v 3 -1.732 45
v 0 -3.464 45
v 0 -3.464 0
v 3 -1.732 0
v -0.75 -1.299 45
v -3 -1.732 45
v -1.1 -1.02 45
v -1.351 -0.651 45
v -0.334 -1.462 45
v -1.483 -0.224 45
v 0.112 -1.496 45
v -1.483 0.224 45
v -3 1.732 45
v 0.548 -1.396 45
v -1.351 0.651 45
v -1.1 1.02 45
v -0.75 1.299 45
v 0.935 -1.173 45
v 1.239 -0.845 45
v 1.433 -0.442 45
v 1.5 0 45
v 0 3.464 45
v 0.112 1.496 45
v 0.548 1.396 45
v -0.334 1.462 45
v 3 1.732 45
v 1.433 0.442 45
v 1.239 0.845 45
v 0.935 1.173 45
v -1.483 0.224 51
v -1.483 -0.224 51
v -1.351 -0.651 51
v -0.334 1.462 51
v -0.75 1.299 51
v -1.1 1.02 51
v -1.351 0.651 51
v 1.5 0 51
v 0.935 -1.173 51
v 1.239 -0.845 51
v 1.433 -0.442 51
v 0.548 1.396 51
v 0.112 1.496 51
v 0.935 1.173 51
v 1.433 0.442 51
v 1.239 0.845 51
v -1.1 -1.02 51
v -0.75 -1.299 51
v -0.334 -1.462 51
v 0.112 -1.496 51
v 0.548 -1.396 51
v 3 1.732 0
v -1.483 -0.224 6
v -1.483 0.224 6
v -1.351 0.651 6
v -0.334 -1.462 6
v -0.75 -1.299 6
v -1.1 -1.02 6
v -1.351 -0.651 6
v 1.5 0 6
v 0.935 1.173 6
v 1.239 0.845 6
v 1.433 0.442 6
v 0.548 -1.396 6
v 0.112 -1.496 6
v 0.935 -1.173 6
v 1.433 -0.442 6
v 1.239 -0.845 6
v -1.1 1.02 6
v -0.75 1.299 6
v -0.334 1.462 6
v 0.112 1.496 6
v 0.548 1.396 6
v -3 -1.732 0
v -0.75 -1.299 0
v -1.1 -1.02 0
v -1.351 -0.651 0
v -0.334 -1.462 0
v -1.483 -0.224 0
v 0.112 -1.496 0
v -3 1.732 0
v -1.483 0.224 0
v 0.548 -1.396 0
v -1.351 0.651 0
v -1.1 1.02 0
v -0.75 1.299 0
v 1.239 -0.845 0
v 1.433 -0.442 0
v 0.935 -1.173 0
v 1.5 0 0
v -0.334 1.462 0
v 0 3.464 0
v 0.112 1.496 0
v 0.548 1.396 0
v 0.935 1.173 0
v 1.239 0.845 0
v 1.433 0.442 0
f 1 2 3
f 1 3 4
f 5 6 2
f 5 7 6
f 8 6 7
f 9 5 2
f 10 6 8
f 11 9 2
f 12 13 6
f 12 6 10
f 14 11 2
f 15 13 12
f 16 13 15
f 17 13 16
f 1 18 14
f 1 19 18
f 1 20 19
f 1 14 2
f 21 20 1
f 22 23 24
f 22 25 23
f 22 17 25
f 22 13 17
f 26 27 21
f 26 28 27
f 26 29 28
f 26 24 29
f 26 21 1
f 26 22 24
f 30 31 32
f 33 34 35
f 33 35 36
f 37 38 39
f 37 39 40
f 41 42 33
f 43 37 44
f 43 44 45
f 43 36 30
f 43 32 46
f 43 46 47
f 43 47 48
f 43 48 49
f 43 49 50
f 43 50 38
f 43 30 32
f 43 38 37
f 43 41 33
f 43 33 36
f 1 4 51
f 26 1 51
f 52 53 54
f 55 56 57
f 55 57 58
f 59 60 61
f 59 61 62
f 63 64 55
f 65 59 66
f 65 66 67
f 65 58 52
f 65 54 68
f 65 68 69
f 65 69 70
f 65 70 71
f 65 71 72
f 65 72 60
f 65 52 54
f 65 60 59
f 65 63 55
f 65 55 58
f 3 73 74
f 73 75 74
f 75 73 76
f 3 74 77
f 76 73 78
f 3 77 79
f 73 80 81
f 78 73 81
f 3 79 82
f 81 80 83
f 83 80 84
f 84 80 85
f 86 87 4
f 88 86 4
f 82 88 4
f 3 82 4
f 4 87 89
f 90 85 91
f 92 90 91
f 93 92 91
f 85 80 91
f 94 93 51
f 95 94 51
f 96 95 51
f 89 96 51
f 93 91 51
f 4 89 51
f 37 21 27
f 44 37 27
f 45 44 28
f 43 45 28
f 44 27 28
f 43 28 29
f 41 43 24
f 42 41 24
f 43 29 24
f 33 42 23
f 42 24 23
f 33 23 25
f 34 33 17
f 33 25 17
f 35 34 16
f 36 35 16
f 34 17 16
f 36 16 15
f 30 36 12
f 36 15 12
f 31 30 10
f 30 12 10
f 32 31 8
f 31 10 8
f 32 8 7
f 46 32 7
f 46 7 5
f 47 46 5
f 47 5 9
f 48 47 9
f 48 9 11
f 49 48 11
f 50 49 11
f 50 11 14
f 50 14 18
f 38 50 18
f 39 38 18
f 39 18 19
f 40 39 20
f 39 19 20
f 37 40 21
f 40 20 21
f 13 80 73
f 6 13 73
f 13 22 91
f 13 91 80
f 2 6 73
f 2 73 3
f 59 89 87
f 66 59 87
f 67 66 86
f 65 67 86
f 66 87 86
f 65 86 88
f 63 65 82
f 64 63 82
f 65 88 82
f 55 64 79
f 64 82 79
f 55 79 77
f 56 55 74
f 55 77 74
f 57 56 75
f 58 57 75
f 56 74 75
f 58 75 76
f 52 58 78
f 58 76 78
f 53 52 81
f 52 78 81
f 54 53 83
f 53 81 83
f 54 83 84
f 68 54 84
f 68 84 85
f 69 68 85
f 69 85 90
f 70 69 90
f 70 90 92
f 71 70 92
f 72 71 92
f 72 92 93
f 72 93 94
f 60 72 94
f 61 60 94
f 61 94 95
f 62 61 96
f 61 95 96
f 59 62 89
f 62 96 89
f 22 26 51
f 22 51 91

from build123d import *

# Parameters (mm, degrees)
F1_DEPTH = 45
F2_R     = 1.5
F3_DEPTH = 6
F4_R     = 1.5
F5_DEPTH = 6


with BuildPart() as f1:
    # F0 (on Top) → F1 (new body)
    with BuildSketch(Plane.XY):
        Polygon((3, -1.7320508076), (3, 1.7320508076), (0, 3.4641016151), (-3, 1.7320508076), (-3, -1.7320508076), (0, -3.4641016151), align=None)
    extrude(amount=F1_DEPTH)

    # F2 (on face) → F3 (join)
    with BuildSketch(Plane.XY.offset(45)):
        Circle(F2_R)
    extrude(amount=F3_DEPTH)

    # F4 (on face) → F5 (cut)
    with BuildSketch(Plane(origin=(0, 0, 0), x_dir=(1, 0, 0), z_dir=(0, 0, -1))):
        Circle(F4_R)
    extrude(amount=-F5_DEPTH, mode=Mode.SUBTRACT)


solid = f1.part
